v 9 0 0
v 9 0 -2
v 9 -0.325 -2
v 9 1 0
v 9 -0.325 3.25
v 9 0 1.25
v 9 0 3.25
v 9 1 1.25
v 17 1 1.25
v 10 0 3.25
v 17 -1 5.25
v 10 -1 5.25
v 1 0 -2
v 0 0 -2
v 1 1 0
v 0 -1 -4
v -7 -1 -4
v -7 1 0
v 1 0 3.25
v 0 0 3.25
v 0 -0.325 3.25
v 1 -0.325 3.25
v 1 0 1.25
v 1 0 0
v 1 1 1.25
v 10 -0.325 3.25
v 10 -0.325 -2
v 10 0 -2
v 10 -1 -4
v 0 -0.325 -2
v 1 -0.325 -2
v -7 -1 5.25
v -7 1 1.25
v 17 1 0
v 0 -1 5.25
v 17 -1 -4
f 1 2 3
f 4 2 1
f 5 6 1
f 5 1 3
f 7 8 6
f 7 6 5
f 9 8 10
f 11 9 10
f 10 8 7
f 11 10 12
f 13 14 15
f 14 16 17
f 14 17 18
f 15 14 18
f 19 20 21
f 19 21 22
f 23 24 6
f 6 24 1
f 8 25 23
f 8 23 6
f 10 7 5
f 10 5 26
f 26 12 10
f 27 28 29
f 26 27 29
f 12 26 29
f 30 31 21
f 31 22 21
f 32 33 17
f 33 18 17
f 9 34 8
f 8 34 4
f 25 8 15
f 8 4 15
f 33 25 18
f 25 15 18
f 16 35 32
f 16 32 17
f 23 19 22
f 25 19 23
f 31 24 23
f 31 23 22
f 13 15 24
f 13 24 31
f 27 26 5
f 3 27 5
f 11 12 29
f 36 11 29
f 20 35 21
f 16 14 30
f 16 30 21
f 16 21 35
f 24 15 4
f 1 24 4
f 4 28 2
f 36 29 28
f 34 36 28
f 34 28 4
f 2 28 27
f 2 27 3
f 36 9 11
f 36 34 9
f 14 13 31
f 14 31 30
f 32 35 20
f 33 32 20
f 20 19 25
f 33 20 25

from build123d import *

# Parameters (mm, degrees)
BOSS_EXTRUDE1_DEPTH  = 1.25
SKETCH2_W            = 1
SKETCH2_H            = 0.325
BOSS_EXTRUDE2_DEPTH  = 2
SKETCH3_W            = 1
SKETCH3_H            = 0.325
BOSS_EXTRUDE3_DEPTH  = 2
BOSS_EXTRUDE7_DEPTH  = 1
BOSS_EXTRUDE8_DEPTH  = 1
BOSS_EXTRUDE9_DEPTH  = 7
BOSS_EXTRUDE10_DEPTH = 7


with BuildPart() as part:
    # Sketch1 → Boss-Extrude1 (new body)
    with BuildSketch(Plane.XY):
        Polygon((1, 0), (9, 0), (9, -0.325), (10, -0.325), (10, -1), (17, -1), (17, 1), (10, 1), (0, 1), (-7, 1), (-7, -1), (0, -1), (0, -0.325), (1, -0.325), align=None)
    extrude(amount=BOSS_EXTRUDE1_DEPTH)

    # Sketch2 → Boss-Extrude2 (add)
    with BuildSketch(Plane.XY.offset(1.25)):
        with Locations((0.5, -0.1625)):
            Rectangle(SKETCH2_W, SKETCH2_H)
        with Locations((9.5, -0.1625)):
            Rectangle(SKETCH2_W, SKETCH2_H)
    extrude(amount=BOSS_EXTRUDE2_DEPTH)

    # Sketch3 → Boss-Extrude3 (add)
    with BuildSketch(Plane(origin=(0, 0, 0), x_dir=(-1, 0, 0), z_dir=(0, 0, -1))):
        with Locations((-9.5, -0.1625)):
            Rectangle(SKETCH3_W, SKETCH3_H)
        with Locations((-0.5, -0.1625)):
            Rectangle(SKETCH3_W, SKETCH3_H)
    extrude(amount=BOSS_EXTRUDE3_DEPTH)

    # Sketch7 → Boss-Extrude7 (add)
    with BuildSketch(Plane(origin=(10, 0, 0), x_dir=(0, 0, -1), z_dir=(1, 0, 0))):
        Polygon((-3.25, 0), (-1.25, 1), (-1.25, 0), (-1.25, -0.325), (-3.25, -0.325), align=None)
        Polygon((2, 0), (0, 1), (0, 0), align=None)
    extrude(amount=-BOSS_EXTRUDE7_DEPTH)

    # Sketch8 → Boss-Extrude8 (add)
    with BuildSketch(Plane.ZY):
        Polygon((-2, 0), (0, 1), (0, 0), align=None)
        Polygon((1.25, 1), (1.25, 0), (3.25, 0), align=None)
    extrude(amount=-BOSS_EXTRUDE8_DEPTH)

    # Sketch10 → Boss-Extrude9 (add)
    with BuildSketch(Plane.ZY):
        Polygon((1.25, 1), (3.25, 0), (5.25, -1), (1.25, -1), align=None)
        Polygon((0, 1), (-2, 0), (-4, -1), (0, -1), align=None)
    extrude(amount=BOSS_EXTRUDE9_DEPTH)

    # Sketch11 → Boss-Extrude10 (add)
    with BuildSketch(Plane(origin=(10, 0, 0), x_dir=(0, 0, -1), z_dir=(1, 0, 0))):
        Polygon((-1.25, 1), (-5.25, -1), (-1.25, -1), align=None)
        Polygon((0, 1), (4, -1), (0, -1), align=None)
    extrude(amount=BOSS_EXTRUDE10_DEPTH)


solid = part.part
